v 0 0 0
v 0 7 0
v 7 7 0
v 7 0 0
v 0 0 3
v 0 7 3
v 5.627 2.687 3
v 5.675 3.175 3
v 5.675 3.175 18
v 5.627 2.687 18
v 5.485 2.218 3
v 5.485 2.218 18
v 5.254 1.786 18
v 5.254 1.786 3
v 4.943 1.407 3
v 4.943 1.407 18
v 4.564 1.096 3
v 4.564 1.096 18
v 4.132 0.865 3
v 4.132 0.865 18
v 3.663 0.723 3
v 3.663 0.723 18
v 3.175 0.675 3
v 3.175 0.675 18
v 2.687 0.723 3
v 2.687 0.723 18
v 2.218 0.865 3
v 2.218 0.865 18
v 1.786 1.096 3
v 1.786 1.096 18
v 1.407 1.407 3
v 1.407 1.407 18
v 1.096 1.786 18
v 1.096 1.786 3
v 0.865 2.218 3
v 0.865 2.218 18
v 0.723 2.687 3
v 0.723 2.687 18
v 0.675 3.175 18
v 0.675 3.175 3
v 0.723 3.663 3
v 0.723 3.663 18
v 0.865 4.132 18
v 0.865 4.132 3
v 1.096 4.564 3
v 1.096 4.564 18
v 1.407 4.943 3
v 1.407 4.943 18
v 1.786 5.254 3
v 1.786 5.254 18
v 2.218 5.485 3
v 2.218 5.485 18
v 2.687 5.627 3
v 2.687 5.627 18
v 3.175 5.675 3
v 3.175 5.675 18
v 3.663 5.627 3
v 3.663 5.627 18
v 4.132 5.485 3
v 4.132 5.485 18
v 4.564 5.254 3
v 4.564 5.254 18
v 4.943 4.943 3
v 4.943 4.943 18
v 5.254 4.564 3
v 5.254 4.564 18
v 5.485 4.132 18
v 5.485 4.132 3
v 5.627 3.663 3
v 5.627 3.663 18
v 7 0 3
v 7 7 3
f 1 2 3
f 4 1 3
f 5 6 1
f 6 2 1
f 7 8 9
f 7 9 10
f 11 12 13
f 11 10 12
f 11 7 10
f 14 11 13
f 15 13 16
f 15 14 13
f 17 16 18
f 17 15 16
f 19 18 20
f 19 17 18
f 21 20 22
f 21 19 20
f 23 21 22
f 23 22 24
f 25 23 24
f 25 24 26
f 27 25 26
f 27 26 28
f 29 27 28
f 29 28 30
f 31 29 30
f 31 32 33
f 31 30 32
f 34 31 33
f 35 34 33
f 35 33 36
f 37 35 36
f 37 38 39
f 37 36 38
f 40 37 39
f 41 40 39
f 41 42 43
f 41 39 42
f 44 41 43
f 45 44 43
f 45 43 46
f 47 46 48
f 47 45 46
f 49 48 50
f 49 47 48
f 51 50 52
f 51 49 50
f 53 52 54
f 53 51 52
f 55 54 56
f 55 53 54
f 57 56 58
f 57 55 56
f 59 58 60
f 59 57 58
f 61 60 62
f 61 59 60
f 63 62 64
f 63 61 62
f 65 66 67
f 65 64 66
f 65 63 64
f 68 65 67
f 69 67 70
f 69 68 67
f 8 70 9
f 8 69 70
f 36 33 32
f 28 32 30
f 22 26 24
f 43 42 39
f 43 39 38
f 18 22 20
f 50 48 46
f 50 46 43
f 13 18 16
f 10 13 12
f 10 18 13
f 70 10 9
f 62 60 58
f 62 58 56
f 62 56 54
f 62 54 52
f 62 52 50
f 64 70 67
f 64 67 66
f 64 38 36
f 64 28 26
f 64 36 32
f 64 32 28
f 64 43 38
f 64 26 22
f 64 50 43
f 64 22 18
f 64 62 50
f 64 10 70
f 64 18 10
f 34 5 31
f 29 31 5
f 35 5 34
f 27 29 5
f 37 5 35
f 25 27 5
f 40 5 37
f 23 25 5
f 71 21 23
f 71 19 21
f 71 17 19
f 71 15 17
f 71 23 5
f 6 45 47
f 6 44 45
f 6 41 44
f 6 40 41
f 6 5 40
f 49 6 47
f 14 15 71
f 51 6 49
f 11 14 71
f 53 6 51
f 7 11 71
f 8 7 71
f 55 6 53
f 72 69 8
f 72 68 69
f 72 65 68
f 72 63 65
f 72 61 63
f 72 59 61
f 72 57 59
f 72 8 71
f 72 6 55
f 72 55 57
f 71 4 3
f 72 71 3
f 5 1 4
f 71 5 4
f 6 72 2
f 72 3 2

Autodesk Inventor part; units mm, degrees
ref_plane "YZ Plane" through (0, 0, 0) normal (1, 0, 0) x (0, 1, 0)
ref_plane "XZ Plane" through (0, 0, 0) normal (0, 1, 0) x (-1, 0, 0)
ref_plane "XY Plane" through (0, 0, 0) normal (0, 0, 1) x (1, 0, 0)
sketch "Sketch1" plane through (0, 0, 0) normal (0, 0, 1) x (1, 0, 0)
  line L0 (0, 0) -> (7, 0)
  line L1 (7, 0) -> (7, 7)
  line L2 (7, 7) -> (0, 7)
  line L3 (0, 7) -> (0, 0)
  dimension "d0" = 7
  dimension "d1" = 7
extrude "Extrusion1" add sketch "Sketch1" along normal blind 3
sketch "Sketch2" plane through (0, 0, 3) normal (0, 0, 1) x (1, 0, 0)
  circle A0 centre (3.175, 3.175) radius 2.5
  point P0 (0, 0)
  dimension "d4" = 5
extrude "Extrusion2" add sketch "Sketch2" along normal blind 15
thread "Thread1" size "M5x0.8" class "6g" standard "ANSI Metric M Profile" full length
properties part number "AD"
